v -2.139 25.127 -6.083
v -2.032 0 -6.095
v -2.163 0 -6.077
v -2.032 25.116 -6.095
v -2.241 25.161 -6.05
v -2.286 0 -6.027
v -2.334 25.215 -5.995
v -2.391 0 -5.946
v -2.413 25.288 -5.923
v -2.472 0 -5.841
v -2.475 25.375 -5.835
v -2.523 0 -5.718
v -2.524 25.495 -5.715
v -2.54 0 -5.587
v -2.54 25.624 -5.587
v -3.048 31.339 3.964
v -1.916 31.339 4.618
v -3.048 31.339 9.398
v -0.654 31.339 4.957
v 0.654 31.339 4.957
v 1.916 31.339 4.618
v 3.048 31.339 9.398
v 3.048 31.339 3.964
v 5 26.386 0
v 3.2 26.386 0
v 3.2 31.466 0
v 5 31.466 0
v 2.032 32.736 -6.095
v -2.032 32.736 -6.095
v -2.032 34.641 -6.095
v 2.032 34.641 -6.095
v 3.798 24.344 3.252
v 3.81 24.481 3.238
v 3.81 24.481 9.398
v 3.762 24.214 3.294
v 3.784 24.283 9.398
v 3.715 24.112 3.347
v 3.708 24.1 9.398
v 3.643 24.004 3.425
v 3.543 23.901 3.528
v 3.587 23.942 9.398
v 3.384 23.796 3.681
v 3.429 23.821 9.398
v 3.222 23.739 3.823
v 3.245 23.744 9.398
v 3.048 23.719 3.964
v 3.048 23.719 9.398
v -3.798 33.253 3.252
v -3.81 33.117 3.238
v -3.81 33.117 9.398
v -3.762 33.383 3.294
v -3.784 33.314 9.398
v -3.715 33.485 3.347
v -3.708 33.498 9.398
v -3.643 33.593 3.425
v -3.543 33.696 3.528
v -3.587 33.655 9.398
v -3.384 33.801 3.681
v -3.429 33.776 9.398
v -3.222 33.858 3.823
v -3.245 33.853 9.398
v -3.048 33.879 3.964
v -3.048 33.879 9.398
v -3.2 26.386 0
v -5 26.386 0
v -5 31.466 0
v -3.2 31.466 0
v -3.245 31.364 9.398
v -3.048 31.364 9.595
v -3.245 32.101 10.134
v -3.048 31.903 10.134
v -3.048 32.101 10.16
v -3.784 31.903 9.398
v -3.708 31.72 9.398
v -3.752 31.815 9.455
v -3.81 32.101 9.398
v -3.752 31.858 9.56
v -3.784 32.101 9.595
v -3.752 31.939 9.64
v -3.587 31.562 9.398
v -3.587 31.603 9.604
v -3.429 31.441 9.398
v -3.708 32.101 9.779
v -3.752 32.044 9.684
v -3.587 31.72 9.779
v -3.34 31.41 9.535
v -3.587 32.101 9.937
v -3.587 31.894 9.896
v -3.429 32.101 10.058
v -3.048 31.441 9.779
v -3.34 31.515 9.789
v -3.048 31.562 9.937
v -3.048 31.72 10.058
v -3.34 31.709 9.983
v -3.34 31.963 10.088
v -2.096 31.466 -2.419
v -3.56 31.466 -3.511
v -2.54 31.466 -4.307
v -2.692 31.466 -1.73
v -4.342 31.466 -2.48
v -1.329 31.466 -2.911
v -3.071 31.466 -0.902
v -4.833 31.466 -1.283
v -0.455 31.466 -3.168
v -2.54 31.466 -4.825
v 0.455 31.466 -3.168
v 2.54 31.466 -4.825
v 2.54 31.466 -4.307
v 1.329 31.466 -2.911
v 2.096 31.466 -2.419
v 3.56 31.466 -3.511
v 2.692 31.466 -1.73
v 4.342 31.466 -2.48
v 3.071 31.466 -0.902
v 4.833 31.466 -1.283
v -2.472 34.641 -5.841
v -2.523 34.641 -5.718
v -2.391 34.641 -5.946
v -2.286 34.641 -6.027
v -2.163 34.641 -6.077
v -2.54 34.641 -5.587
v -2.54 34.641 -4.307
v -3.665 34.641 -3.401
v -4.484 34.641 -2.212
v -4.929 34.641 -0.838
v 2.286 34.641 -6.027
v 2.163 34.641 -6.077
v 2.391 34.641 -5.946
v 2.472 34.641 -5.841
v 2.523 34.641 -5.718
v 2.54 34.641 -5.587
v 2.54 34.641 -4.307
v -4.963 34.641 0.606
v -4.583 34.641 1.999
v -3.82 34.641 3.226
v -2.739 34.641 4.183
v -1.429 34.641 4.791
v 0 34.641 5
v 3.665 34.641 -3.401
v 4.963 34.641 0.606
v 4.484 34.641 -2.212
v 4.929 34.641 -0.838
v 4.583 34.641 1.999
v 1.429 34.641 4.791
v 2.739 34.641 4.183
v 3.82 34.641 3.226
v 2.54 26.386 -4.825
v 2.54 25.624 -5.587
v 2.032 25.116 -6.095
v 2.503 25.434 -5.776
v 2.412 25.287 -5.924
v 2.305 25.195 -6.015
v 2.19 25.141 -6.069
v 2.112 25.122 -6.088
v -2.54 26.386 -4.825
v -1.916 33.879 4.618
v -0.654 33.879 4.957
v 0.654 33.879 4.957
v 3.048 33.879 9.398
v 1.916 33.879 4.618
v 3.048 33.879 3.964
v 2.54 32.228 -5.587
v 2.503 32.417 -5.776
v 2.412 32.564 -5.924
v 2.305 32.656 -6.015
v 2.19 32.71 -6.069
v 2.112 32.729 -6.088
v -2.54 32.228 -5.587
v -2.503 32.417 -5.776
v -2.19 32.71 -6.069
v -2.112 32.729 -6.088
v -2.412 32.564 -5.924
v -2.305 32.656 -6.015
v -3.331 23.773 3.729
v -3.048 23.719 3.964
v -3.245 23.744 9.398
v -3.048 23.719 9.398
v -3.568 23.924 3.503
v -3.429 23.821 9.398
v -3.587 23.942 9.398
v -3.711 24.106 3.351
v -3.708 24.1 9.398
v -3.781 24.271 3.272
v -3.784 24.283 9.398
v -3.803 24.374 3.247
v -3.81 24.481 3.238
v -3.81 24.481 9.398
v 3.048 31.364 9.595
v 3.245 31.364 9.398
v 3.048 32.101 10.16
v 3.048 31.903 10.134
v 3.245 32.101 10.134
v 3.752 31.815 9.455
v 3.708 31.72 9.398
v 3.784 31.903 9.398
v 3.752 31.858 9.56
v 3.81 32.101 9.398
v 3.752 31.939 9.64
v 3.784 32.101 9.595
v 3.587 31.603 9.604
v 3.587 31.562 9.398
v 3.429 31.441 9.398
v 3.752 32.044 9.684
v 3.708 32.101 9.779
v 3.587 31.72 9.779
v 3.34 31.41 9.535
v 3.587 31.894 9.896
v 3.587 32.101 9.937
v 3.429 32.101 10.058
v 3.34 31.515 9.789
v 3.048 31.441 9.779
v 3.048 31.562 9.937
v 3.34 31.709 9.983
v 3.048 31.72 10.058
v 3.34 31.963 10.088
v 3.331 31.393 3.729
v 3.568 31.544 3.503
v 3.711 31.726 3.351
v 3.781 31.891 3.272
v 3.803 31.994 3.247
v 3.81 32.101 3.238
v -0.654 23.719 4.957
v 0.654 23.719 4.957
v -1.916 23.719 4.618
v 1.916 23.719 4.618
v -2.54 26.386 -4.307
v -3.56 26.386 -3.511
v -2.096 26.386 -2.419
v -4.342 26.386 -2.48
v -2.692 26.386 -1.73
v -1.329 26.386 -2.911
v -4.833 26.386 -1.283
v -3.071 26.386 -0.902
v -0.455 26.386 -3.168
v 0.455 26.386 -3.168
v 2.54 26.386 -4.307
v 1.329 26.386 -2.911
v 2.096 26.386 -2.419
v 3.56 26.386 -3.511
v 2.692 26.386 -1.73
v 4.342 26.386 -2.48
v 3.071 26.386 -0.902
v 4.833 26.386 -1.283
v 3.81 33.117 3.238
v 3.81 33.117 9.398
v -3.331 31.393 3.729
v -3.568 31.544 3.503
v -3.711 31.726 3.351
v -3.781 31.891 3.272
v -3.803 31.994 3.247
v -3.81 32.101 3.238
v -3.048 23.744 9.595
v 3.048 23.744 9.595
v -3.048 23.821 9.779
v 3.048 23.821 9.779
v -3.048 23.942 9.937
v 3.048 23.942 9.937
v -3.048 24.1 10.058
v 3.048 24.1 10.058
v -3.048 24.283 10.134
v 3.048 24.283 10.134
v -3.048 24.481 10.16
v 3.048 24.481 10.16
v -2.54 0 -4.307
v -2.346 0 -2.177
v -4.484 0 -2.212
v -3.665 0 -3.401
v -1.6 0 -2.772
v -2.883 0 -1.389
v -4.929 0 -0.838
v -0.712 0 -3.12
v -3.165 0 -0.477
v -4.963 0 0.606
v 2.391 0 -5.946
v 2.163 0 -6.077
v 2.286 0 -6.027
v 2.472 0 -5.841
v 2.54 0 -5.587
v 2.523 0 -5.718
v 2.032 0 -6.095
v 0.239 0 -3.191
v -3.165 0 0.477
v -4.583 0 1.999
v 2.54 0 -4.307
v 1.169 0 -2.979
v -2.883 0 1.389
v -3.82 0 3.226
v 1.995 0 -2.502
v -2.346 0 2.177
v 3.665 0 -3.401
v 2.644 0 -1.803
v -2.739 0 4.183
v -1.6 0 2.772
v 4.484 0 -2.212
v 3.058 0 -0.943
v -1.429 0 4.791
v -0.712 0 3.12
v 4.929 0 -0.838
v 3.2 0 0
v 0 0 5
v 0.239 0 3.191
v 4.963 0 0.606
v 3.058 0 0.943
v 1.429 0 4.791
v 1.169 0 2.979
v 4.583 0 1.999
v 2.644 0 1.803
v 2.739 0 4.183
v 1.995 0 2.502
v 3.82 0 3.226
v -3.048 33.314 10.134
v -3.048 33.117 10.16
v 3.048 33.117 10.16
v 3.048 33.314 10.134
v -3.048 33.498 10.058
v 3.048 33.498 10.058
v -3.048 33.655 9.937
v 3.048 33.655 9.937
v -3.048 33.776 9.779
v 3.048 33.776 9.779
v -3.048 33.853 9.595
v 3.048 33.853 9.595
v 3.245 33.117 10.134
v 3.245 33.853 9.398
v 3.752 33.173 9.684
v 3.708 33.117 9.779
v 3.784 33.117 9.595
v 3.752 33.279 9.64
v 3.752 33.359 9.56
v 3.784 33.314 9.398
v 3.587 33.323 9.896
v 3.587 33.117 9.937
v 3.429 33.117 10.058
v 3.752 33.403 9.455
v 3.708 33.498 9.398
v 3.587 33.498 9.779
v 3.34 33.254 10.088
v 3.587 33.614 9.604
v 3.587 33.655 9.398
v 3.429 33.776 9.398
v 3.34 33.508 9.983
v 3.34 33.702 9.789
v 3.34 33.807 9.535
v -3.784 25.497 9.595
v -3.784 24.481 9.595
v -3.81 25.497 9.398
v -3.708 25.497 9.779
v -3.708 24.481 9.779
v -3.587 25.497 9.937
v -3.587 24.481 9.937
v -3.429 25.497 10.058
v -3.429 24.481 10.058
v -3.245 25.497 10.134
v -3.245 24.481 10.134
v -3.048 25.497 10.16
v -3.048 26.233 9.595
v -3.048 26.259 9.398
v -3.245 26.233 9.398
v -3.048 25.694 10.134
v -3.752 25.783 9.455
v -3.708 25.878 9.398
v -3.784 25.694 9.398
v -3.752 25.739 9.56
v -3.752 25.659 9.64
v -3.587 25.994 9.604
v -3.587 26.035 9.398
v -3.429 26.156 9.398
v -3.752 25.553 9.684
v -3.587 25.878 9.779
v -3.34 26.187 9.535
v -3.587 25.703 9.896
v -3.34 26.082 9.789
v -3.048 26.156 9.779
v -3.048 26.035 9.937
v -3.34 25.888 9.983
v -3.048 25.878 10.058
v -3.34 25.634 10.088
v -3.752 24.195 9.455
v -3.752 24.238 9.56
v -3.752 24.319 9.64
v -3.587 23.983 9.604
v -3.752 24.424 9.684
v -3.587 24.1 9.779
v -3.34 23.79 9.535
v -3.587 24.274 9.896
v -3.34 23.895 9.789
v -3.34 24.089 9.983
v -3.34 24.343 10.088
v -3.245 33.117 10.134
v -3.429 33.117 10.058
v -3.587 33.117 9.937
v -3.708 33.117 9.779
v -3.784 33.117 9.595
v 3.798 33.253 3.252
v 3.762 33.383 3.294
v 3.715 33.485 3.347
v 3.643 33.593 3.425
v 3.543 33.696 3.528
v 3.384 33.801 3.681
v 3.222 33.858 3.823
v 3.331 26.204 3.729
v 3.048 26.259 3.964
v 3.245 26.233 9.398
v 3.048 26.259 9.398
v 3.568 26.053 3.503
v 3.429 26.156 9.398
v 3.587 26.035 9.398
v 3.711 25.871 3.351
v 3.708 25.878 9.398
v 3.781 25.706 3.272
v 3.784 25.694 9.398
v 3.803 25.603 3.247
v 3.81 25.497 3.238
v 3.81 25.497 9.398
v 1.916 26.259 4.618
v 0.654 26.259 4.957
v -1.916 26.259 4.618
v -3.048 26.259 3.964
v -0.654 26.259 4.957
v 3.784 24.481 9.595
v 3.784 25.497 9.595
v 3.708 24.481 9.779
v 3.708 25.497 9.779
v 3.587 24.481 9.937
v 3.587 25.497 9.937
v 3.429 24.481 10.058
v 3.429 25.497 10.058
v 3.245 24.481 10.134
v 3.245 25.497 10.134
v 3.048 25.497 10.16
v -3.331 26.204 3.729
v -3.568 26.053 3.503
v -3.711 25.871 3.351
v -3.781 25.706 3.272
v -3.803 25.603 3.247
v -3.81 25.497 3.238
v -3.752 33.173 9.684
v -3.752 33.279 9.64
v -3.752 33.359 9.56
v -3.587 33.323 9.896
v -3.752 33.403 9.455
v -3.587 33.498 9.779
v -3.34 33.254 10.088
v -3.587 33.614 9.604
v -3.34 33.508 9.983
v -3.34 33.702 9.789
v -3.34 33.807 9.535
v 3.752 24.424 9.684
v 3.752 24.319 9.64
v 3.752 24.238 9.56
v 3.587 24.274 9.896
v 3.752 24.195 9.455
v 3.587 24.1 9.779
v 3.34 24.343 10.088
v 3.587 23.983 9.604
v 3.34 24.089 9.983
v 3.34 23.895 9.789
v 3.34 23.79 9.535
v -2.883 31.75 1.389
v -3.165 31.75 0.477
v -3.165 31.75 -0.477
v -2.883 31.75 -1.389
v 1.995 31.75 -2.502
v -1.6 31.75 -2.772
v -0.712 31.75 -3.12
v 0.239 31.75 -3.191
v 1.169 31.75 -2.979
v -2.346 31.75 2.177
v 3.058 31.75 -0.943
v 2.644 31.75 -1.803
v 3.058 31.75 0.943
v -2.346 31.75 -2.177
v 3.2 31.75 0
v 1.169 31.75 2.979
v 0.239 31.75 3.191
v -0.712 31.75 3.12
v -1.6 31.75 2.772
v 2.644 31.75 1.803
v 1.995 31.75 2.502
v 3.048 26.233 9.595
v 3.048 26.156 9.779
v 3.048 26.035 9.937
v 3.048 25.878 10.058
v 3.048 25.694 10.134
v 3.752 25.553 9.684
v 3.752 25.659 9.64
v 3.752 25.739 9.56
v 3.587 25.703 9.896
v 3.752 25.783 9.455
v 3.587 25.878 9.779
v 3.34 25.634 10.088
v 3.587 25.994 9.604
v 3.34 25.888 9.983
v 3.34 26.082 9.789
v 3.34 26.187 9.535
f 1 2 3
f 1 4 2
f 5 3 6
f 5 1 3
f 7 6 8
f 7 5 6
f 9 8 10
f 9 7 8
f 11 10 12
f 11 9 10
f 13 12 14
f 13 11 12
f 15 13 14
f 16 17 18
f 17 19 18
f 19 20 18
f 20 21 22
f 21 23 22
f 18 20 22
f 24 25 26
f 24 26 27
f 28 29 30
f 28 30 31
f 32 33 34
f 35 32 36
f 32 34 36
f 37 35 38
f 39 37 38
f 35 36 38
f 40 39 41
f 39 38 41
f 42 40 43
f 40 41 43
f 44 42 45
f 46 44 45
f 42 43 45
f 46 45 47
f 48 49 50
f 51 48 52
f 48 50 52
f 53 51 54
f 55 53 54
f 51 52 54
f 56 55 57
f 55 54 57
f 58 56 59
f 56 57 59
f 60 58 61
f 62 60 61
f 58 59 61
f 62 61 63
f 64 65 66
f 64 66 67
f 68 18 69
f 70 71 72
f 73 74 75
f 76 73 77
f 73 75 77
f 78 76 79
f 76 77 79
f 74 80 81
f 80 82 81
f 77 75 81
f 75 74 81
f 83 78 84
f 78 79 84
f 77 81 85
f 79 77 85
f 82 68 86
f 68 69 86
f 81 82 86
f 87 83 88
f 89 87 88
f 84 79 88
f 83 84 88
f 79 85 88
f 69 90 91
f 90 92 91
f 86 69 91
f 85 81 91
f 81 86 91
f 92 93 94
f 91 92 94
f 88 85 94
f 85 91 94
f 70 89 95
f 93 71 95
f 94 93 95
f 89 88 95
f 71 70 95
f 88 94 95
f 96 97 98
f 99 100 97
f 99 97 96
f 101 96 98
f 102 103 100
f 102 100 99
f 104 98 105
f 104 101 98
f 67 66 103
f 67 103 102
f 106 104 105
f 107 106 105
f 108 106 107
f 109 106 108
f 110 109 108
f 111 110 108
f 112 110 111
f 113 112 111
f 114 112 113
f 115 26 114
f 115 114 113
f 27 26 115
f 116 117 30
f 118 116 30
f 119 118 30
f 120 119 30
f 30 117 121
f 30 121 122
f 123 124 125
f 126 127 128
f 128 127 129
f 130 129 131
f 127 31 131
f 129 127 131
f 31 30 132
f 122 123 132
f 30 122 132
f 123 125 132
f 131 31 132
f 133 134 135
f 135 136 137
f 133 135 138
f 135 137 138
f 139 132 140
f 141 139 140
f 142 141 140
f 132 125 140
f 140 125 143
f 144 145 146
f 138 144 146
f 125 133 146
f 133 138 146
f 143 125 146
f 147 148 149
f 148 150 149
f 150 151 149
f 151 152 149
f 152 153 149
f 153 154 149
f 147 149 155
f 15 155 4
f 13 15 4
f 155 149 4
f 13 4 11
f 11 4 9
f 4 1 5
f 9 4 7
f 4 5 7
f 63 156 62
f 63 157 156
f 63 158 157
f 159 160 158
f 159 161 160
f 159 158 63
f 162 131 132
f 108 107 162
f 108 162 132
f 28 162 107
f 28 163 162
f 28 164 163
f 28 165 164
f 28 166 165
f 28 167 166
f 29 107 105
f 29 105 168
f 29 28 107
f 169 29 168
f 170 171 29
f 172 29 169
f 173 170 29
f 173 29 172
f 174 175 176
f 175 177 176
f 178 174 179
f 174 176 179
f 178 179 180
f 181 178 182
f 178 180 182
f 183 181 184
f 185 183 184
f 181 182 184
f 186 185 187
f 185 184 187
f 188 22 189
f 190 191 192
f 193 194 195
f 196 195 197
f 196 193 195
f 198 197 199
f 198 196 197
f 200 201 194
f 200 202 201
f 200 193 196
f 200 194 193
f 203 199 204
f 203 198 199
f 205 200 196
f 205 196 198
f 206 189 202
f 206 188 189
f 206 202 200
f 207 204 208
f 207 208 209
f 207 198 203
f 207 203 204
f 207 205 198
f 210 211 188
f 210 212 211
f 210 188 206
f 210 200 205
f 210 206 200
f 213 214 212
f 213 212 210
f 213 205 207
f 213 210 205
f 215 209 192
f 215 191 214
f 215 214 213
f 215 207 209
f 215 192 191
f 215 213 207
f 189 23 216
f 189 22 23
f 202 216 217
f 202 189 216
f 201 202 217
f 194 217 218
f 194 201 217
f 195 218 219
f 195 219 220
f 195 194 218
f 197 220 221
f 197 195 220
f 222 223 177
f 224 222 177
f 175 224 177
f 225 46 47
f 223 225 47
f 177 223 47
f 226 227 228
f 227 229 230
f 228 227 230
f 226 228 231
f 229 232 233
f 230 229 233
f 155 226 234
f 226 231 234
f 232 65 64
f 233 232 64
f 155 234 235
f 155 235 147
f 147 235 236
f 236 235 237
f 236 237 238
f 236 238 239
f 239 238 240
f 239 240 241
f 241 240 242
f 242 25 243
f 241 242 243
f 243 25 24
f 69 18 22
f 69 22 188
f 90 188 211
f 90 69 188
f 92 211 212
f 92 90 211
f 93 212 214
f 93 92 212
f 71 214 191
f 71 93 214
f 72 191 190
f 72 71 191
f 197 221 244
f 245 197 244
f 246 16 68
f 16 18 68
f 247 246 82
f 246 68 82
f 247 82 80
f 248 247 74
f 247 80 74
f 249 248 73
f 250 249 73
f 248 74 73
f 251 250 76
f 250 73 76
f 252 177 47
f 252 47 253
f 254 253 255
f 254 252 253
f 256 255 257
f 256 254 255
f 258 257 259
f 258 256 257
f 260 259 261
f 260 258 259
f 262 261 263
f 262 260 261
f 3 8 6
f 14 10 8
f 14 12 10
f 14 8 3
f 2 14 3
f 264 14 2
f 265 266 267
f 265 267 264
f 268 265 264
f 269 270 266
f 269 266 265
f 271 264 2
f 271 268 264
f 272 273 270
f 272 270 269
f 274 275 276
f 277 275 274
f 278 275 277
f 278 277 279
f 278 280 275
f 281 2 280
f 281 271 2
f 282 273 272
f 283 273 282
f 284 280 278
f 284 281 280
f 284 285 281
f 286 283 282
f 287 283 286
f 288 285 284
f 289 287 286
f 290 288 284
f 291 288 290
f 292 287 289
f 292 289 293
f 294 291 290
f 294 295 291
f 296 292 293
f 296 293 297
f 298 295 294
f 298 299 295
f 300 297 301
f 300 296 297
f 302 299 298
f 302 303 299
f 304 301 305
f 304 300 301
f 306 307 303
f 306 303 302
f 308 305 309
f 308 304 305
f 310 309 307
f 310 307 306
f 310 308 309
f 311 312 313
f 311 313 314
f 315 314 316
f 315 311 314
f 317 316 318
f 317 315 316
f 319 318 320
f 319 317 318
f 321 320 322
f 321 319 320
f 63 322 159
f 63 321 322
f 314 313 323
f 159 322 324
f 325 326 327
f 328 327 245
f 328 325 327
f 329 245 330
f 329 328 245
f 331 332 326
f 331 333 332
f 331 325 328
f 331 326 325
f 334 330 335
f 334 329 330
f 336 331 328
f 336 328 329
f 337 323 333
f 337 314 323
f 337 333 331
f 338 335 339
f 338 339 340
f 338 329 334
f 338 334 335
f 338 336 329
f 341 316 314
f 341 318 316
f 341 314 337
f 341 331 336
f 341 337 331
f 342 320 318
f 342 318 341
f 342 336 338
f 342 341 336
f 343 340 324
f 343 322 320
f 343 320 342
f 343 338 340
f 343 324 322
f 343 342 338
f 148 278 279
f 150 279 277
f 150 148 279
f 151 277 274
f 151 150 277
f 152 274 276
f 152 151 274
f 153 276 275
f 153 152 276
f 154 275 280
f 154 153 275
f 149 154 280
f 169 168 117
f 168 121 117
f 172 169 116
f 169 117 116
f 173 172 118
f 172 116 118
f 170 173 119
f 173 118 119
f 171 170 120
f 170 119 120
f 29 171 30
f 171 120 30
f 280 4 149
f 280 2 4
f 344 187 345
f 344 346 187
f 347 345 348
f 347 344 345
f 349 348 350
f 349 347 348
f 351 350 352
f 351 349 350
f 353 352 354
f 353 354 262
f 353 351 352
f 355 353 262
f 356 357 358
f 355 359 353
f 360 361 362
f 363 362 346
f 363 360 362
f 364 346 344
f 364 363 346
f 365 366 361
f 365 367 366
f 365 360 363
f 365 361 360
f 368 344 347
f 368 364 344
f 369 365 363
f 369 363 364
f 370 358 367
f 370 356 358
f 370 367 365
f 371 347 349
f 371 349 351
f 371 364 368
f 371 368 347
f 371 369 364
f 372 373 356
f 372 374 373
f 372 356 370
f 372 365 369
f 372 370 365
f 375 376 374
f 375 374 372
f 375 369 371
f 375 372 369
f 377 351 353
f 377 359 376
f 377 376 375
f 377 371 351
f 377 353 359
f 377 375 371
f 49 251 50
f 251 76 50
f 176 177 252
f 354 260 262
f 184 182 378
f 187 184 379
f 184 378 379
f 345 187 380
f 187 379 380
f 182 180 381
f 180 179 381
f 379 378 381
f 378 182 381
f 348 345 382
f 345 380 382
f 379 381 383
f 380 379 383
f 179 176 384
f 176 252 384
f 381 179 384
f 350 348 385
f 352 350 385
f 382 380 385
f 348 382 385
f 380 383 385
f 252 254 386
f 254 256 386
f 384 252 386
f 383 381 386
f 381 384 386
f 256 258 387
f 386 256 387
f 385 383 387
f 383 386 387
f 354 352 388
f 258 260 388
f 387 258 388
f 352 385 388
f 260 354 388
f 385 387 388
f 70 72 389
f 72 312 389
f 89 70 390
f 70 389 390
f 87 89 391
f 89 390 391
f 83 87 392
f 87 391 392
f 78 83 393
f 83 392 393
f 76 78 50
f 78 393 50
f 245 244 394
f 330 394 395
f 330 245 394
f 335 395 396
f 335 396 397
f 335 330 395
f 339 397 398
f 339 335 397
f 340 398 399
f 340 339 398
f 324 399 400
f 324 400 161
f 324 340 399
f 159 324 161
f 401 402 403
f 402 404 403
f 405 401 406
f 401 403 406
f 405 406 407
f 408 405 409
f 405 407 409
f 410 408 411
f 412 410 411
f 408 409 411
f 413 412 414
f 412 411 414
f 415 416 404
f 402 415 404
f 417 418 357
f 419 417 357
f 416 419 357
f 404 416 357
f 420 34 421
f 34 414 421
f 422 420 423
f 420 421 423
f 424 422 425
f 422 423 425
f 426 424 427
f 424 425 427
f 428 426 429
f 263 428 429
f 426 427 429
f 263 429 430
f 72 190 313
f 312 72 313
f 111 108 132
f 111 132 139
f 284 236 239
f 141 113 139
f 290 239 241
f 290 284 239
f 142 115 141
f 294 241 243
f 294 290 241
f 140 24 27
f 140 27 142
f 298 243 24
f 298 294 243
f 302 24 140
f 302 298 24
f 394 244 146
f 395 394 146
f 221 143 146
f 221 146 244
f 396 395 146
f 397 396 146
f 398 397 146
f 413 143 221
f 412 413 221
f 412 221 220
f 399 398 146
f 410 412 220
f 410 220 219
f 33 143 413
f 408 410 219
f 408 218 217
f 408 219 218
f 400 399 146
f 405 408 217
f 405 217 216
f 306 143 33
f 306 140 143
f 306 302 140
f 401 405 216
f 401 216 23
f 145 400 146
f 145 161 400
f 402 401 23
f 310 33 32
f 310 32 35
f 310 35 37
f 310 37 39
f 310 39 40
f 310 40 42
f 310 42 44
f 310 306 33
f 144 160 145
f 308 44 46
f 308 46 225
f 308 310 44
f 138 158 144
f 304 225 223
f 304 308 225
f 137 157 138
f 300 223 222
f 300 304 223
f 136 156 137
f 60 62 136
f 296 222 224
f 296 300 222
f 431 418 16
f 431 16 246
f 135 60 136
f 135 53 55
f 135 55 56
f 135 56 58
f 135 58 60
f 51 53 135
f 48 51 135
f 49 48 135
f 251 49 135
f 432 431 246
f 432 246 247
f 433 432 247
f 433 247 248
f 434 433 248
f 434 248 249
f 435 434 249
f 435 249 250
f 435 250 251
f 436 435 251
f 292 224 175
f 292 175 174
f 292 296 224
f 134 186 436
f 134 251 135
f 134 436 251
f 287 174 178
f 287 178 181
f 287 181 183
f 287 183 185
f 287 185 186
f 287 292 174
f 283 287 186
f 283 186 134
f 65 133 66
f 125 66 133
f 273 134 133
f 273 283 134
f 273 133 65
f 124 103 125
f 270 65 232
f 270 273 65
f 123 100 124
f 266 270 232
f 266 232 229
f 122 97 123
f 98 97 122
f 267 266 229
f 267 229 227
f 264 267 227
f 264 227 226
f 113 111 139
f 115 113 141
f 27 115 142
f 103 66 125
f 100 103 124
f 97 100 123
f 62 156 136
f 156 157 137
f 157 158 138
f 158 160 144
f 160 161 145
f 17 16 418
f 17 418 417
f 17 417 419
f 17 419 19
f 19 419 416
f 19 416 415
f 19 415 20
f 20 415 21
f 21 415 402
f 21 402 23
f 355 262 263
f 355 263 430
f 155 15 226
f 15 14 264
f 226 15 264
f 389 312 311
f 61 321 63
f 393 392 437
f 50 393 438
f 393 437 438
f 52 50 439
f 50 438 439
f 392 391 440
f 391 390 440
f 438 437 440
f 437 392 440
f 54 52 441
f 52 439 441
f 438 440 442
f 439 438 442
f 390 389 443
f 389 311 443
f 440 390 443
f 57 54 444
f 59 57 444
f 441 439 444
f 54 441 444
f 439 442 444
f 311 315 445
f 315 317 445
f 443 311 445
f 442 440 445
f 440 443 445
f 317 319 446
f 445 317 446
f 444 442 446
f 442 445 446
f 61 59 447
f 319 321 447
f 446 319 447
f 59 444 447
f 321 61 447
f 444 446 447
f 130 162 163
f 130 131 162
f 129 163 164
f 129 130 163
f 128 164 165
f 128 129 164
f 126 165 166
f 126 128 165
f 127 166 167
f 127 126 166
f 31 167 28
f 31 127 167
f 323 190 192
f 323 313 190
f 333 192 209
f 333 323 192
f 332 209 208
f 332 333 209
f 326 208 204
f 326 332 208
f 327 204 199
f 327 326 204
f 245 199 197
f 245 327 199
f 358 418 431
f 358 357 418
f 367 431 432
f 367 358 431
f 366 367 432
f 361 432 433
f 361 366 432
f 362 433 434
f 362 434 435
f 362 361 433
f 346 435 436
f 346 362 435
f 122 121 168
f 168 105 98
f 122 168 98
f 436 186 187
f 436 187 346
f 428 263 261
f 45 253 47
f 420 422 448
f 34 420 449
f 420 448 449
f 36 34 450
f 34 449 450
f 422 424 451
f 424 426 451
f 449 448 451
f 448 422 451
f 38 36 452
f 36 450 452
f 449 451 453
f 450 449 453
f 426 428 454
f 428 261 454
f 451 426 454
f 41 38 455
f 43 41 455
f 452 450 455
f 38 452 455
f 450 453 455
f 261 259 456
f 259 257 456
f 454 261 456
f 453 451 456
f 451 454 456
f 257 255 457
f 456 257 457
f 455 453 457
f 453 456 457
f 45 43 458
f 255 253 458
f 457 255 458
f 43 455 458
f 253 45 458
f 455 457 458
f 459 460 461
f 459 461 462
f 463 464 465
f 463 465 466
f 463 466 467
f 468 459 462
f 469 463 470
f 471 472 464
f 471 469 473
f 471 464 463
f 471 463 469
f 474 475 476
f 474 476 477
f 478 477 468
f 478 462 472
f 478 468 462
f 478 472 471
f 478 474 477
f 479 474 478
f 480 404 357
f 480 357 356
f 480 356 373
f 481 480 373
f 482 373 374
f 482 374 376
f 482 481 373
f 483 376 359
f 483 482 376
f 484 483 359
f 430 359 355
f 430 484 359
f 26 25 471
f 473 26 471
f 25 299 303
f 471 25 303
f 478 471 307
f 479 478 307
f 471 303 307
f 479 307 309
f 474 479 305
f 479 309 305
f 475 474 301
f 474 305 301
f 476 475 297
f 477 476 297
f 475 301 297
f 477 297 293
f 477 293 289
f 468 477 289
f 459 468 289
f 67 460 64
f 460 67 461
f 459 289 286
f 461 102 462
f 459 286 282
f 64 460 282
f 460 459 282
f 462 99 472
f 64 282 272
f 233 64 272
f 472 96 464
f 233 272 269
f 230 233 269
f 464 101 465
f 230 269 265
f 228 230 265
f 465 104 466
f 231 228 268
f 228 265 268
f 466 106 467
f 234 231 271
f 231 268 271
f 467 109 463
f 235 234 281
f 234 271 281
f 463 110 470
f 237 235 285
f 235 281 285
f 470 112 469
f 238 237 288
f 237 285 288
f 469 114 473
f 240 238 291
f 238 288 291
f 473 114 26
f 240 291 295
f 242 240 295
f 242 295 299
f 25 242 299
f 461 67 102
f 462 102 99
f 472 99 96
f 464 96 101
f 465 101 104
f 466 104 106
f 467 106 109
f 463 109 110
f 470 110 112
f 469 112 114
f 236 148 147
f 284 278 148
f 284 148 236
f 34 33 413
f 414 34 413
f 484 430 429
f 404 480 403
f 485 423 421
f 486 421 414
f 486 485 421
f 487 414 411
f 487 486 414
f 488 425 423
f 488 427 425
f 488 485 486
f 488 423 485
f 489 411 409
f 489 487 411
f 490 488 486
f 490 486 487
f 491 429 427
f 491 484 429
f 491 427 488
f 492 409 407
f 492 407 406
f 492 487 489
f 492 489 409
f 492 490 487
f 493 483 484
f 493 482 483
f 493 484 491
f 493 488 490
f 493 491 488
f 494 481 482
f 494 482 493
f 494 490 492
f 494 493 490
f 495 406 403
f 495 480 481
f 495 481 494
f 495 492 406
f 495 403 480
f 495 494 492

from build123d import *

# Parameters (mm, degrees)
F1_R          = 5
F2_DEPTH      = 34.64052
F3_W          = 5.08
F3_H          = 2.89434
F4_DEPTH      = 34.64052
F6_W          = 10.16
F6_H          = 5.08
F7_DEPTH      = 25.4
F8_W          = 2.54
F8_H          = 7.62
F9_DEPTH      = 3.81
F9_DEPTH_BACK = 3.81
F5_R          = 3.2004
F10_DEPTH     = 31.75
F11_R         = 0.762
F12_SIZE      = 1.27
F13_R         = 0.508


with BuildPart() as f2:
    # F1 (on Front) → F2 (new body)
    with BuildSketch(Plane.XZ):
        Circle(F1_R)
    extrude(amount=-F2_DEPTH)

    # F3 (on face) → F4 (join, through all)
    with BuildSketch(Plane.XZ):
        with Locations((0, -4.64757)):
            Rectangle(F3_W, F3_H)
    extrude(amount=-F4_DEPTH)

    # F6 (on Top) → F7 (cut)
    with BuildSketch(Plane.XY):
        with Locations((0, 28.92552)):
            Rectangle(F6_W, F6_H)
    extrude(amount=-F7_DEPTH, mode=Mode.SUBTRACT)

    # F8 (on Right) → F9 (join, two sides)
    with BuildSketch(Plane.YZ) as f9_sk:
        with Locations((32.60852, 6.35)):
            Rectangle(F8_W, F8_H)
        with Locations((24.98852, 6.35)):
            Rectangle(F8_W, F8_H)
    extrude(amount=F9_DEPTH)
    extrude(f9_sk.sketch, amount=-F9_DEPTH_BACK)

    # F5 (on face) → F10 (cut)
    with BuildSketch(Plane.XZ):
        Circle(F5_R)
    extrude(amount=-F10_DEPTH, mode=Mode.SUBTRACT)

    # F11
    f11_edges = [f2.edges().sort_by_distance(p)[0] for p in [
        (0, 26.25852, 10.16),
        (0, 31.33852, 10.16),
        (0, 33.87852, 10.16),
        (0, 23.71852, 10.16),
        (-3.81, 26.25852, 6.698943),
        (-3.81, 23.71852, 6.698943),
        (-3.81, 24.98852, 10.16),
        (-3.81, 31.33852, 6.698943),
        (-3.81, 32.60852, 10.16),
        (-3.81, 33.87852, 6.698943),
        (3.81, 24.98852, 10.16),
        (3.81, 26.25852, 6.698943),
        (3.81, 23.71852, 6.698943),
        (3.81, 31.33852, 6.698943),
        (3.81, 32.60852, 10.16),
        (3.81, 33.87852, 6.698943),
    ]]
    fillet(f11_edges, radius=F11_R)

    # F12
    f12_edges = [f2.edges().sort_by_distance(p)[0] for p in [
        (0, 26.38552, -6.09474),
        (0, 31.46552, -6.09474),
    ]]
    chamfer(f12_edges, length=F12_SIZE)

    # F13
    f13_edges = [f2.edges().sort_by_distance(p)[0] for p in [
        (-2.54, 12.55776, -6.09474),
        (-2.54, 33.68802, -6.09474),
        (2.54, 33.68802, -6.09474),
        (2.54, 12.55776, -6.09474),
    ]]
    fillet(f13_edges, radius=F13_R)


solid = f2.part
